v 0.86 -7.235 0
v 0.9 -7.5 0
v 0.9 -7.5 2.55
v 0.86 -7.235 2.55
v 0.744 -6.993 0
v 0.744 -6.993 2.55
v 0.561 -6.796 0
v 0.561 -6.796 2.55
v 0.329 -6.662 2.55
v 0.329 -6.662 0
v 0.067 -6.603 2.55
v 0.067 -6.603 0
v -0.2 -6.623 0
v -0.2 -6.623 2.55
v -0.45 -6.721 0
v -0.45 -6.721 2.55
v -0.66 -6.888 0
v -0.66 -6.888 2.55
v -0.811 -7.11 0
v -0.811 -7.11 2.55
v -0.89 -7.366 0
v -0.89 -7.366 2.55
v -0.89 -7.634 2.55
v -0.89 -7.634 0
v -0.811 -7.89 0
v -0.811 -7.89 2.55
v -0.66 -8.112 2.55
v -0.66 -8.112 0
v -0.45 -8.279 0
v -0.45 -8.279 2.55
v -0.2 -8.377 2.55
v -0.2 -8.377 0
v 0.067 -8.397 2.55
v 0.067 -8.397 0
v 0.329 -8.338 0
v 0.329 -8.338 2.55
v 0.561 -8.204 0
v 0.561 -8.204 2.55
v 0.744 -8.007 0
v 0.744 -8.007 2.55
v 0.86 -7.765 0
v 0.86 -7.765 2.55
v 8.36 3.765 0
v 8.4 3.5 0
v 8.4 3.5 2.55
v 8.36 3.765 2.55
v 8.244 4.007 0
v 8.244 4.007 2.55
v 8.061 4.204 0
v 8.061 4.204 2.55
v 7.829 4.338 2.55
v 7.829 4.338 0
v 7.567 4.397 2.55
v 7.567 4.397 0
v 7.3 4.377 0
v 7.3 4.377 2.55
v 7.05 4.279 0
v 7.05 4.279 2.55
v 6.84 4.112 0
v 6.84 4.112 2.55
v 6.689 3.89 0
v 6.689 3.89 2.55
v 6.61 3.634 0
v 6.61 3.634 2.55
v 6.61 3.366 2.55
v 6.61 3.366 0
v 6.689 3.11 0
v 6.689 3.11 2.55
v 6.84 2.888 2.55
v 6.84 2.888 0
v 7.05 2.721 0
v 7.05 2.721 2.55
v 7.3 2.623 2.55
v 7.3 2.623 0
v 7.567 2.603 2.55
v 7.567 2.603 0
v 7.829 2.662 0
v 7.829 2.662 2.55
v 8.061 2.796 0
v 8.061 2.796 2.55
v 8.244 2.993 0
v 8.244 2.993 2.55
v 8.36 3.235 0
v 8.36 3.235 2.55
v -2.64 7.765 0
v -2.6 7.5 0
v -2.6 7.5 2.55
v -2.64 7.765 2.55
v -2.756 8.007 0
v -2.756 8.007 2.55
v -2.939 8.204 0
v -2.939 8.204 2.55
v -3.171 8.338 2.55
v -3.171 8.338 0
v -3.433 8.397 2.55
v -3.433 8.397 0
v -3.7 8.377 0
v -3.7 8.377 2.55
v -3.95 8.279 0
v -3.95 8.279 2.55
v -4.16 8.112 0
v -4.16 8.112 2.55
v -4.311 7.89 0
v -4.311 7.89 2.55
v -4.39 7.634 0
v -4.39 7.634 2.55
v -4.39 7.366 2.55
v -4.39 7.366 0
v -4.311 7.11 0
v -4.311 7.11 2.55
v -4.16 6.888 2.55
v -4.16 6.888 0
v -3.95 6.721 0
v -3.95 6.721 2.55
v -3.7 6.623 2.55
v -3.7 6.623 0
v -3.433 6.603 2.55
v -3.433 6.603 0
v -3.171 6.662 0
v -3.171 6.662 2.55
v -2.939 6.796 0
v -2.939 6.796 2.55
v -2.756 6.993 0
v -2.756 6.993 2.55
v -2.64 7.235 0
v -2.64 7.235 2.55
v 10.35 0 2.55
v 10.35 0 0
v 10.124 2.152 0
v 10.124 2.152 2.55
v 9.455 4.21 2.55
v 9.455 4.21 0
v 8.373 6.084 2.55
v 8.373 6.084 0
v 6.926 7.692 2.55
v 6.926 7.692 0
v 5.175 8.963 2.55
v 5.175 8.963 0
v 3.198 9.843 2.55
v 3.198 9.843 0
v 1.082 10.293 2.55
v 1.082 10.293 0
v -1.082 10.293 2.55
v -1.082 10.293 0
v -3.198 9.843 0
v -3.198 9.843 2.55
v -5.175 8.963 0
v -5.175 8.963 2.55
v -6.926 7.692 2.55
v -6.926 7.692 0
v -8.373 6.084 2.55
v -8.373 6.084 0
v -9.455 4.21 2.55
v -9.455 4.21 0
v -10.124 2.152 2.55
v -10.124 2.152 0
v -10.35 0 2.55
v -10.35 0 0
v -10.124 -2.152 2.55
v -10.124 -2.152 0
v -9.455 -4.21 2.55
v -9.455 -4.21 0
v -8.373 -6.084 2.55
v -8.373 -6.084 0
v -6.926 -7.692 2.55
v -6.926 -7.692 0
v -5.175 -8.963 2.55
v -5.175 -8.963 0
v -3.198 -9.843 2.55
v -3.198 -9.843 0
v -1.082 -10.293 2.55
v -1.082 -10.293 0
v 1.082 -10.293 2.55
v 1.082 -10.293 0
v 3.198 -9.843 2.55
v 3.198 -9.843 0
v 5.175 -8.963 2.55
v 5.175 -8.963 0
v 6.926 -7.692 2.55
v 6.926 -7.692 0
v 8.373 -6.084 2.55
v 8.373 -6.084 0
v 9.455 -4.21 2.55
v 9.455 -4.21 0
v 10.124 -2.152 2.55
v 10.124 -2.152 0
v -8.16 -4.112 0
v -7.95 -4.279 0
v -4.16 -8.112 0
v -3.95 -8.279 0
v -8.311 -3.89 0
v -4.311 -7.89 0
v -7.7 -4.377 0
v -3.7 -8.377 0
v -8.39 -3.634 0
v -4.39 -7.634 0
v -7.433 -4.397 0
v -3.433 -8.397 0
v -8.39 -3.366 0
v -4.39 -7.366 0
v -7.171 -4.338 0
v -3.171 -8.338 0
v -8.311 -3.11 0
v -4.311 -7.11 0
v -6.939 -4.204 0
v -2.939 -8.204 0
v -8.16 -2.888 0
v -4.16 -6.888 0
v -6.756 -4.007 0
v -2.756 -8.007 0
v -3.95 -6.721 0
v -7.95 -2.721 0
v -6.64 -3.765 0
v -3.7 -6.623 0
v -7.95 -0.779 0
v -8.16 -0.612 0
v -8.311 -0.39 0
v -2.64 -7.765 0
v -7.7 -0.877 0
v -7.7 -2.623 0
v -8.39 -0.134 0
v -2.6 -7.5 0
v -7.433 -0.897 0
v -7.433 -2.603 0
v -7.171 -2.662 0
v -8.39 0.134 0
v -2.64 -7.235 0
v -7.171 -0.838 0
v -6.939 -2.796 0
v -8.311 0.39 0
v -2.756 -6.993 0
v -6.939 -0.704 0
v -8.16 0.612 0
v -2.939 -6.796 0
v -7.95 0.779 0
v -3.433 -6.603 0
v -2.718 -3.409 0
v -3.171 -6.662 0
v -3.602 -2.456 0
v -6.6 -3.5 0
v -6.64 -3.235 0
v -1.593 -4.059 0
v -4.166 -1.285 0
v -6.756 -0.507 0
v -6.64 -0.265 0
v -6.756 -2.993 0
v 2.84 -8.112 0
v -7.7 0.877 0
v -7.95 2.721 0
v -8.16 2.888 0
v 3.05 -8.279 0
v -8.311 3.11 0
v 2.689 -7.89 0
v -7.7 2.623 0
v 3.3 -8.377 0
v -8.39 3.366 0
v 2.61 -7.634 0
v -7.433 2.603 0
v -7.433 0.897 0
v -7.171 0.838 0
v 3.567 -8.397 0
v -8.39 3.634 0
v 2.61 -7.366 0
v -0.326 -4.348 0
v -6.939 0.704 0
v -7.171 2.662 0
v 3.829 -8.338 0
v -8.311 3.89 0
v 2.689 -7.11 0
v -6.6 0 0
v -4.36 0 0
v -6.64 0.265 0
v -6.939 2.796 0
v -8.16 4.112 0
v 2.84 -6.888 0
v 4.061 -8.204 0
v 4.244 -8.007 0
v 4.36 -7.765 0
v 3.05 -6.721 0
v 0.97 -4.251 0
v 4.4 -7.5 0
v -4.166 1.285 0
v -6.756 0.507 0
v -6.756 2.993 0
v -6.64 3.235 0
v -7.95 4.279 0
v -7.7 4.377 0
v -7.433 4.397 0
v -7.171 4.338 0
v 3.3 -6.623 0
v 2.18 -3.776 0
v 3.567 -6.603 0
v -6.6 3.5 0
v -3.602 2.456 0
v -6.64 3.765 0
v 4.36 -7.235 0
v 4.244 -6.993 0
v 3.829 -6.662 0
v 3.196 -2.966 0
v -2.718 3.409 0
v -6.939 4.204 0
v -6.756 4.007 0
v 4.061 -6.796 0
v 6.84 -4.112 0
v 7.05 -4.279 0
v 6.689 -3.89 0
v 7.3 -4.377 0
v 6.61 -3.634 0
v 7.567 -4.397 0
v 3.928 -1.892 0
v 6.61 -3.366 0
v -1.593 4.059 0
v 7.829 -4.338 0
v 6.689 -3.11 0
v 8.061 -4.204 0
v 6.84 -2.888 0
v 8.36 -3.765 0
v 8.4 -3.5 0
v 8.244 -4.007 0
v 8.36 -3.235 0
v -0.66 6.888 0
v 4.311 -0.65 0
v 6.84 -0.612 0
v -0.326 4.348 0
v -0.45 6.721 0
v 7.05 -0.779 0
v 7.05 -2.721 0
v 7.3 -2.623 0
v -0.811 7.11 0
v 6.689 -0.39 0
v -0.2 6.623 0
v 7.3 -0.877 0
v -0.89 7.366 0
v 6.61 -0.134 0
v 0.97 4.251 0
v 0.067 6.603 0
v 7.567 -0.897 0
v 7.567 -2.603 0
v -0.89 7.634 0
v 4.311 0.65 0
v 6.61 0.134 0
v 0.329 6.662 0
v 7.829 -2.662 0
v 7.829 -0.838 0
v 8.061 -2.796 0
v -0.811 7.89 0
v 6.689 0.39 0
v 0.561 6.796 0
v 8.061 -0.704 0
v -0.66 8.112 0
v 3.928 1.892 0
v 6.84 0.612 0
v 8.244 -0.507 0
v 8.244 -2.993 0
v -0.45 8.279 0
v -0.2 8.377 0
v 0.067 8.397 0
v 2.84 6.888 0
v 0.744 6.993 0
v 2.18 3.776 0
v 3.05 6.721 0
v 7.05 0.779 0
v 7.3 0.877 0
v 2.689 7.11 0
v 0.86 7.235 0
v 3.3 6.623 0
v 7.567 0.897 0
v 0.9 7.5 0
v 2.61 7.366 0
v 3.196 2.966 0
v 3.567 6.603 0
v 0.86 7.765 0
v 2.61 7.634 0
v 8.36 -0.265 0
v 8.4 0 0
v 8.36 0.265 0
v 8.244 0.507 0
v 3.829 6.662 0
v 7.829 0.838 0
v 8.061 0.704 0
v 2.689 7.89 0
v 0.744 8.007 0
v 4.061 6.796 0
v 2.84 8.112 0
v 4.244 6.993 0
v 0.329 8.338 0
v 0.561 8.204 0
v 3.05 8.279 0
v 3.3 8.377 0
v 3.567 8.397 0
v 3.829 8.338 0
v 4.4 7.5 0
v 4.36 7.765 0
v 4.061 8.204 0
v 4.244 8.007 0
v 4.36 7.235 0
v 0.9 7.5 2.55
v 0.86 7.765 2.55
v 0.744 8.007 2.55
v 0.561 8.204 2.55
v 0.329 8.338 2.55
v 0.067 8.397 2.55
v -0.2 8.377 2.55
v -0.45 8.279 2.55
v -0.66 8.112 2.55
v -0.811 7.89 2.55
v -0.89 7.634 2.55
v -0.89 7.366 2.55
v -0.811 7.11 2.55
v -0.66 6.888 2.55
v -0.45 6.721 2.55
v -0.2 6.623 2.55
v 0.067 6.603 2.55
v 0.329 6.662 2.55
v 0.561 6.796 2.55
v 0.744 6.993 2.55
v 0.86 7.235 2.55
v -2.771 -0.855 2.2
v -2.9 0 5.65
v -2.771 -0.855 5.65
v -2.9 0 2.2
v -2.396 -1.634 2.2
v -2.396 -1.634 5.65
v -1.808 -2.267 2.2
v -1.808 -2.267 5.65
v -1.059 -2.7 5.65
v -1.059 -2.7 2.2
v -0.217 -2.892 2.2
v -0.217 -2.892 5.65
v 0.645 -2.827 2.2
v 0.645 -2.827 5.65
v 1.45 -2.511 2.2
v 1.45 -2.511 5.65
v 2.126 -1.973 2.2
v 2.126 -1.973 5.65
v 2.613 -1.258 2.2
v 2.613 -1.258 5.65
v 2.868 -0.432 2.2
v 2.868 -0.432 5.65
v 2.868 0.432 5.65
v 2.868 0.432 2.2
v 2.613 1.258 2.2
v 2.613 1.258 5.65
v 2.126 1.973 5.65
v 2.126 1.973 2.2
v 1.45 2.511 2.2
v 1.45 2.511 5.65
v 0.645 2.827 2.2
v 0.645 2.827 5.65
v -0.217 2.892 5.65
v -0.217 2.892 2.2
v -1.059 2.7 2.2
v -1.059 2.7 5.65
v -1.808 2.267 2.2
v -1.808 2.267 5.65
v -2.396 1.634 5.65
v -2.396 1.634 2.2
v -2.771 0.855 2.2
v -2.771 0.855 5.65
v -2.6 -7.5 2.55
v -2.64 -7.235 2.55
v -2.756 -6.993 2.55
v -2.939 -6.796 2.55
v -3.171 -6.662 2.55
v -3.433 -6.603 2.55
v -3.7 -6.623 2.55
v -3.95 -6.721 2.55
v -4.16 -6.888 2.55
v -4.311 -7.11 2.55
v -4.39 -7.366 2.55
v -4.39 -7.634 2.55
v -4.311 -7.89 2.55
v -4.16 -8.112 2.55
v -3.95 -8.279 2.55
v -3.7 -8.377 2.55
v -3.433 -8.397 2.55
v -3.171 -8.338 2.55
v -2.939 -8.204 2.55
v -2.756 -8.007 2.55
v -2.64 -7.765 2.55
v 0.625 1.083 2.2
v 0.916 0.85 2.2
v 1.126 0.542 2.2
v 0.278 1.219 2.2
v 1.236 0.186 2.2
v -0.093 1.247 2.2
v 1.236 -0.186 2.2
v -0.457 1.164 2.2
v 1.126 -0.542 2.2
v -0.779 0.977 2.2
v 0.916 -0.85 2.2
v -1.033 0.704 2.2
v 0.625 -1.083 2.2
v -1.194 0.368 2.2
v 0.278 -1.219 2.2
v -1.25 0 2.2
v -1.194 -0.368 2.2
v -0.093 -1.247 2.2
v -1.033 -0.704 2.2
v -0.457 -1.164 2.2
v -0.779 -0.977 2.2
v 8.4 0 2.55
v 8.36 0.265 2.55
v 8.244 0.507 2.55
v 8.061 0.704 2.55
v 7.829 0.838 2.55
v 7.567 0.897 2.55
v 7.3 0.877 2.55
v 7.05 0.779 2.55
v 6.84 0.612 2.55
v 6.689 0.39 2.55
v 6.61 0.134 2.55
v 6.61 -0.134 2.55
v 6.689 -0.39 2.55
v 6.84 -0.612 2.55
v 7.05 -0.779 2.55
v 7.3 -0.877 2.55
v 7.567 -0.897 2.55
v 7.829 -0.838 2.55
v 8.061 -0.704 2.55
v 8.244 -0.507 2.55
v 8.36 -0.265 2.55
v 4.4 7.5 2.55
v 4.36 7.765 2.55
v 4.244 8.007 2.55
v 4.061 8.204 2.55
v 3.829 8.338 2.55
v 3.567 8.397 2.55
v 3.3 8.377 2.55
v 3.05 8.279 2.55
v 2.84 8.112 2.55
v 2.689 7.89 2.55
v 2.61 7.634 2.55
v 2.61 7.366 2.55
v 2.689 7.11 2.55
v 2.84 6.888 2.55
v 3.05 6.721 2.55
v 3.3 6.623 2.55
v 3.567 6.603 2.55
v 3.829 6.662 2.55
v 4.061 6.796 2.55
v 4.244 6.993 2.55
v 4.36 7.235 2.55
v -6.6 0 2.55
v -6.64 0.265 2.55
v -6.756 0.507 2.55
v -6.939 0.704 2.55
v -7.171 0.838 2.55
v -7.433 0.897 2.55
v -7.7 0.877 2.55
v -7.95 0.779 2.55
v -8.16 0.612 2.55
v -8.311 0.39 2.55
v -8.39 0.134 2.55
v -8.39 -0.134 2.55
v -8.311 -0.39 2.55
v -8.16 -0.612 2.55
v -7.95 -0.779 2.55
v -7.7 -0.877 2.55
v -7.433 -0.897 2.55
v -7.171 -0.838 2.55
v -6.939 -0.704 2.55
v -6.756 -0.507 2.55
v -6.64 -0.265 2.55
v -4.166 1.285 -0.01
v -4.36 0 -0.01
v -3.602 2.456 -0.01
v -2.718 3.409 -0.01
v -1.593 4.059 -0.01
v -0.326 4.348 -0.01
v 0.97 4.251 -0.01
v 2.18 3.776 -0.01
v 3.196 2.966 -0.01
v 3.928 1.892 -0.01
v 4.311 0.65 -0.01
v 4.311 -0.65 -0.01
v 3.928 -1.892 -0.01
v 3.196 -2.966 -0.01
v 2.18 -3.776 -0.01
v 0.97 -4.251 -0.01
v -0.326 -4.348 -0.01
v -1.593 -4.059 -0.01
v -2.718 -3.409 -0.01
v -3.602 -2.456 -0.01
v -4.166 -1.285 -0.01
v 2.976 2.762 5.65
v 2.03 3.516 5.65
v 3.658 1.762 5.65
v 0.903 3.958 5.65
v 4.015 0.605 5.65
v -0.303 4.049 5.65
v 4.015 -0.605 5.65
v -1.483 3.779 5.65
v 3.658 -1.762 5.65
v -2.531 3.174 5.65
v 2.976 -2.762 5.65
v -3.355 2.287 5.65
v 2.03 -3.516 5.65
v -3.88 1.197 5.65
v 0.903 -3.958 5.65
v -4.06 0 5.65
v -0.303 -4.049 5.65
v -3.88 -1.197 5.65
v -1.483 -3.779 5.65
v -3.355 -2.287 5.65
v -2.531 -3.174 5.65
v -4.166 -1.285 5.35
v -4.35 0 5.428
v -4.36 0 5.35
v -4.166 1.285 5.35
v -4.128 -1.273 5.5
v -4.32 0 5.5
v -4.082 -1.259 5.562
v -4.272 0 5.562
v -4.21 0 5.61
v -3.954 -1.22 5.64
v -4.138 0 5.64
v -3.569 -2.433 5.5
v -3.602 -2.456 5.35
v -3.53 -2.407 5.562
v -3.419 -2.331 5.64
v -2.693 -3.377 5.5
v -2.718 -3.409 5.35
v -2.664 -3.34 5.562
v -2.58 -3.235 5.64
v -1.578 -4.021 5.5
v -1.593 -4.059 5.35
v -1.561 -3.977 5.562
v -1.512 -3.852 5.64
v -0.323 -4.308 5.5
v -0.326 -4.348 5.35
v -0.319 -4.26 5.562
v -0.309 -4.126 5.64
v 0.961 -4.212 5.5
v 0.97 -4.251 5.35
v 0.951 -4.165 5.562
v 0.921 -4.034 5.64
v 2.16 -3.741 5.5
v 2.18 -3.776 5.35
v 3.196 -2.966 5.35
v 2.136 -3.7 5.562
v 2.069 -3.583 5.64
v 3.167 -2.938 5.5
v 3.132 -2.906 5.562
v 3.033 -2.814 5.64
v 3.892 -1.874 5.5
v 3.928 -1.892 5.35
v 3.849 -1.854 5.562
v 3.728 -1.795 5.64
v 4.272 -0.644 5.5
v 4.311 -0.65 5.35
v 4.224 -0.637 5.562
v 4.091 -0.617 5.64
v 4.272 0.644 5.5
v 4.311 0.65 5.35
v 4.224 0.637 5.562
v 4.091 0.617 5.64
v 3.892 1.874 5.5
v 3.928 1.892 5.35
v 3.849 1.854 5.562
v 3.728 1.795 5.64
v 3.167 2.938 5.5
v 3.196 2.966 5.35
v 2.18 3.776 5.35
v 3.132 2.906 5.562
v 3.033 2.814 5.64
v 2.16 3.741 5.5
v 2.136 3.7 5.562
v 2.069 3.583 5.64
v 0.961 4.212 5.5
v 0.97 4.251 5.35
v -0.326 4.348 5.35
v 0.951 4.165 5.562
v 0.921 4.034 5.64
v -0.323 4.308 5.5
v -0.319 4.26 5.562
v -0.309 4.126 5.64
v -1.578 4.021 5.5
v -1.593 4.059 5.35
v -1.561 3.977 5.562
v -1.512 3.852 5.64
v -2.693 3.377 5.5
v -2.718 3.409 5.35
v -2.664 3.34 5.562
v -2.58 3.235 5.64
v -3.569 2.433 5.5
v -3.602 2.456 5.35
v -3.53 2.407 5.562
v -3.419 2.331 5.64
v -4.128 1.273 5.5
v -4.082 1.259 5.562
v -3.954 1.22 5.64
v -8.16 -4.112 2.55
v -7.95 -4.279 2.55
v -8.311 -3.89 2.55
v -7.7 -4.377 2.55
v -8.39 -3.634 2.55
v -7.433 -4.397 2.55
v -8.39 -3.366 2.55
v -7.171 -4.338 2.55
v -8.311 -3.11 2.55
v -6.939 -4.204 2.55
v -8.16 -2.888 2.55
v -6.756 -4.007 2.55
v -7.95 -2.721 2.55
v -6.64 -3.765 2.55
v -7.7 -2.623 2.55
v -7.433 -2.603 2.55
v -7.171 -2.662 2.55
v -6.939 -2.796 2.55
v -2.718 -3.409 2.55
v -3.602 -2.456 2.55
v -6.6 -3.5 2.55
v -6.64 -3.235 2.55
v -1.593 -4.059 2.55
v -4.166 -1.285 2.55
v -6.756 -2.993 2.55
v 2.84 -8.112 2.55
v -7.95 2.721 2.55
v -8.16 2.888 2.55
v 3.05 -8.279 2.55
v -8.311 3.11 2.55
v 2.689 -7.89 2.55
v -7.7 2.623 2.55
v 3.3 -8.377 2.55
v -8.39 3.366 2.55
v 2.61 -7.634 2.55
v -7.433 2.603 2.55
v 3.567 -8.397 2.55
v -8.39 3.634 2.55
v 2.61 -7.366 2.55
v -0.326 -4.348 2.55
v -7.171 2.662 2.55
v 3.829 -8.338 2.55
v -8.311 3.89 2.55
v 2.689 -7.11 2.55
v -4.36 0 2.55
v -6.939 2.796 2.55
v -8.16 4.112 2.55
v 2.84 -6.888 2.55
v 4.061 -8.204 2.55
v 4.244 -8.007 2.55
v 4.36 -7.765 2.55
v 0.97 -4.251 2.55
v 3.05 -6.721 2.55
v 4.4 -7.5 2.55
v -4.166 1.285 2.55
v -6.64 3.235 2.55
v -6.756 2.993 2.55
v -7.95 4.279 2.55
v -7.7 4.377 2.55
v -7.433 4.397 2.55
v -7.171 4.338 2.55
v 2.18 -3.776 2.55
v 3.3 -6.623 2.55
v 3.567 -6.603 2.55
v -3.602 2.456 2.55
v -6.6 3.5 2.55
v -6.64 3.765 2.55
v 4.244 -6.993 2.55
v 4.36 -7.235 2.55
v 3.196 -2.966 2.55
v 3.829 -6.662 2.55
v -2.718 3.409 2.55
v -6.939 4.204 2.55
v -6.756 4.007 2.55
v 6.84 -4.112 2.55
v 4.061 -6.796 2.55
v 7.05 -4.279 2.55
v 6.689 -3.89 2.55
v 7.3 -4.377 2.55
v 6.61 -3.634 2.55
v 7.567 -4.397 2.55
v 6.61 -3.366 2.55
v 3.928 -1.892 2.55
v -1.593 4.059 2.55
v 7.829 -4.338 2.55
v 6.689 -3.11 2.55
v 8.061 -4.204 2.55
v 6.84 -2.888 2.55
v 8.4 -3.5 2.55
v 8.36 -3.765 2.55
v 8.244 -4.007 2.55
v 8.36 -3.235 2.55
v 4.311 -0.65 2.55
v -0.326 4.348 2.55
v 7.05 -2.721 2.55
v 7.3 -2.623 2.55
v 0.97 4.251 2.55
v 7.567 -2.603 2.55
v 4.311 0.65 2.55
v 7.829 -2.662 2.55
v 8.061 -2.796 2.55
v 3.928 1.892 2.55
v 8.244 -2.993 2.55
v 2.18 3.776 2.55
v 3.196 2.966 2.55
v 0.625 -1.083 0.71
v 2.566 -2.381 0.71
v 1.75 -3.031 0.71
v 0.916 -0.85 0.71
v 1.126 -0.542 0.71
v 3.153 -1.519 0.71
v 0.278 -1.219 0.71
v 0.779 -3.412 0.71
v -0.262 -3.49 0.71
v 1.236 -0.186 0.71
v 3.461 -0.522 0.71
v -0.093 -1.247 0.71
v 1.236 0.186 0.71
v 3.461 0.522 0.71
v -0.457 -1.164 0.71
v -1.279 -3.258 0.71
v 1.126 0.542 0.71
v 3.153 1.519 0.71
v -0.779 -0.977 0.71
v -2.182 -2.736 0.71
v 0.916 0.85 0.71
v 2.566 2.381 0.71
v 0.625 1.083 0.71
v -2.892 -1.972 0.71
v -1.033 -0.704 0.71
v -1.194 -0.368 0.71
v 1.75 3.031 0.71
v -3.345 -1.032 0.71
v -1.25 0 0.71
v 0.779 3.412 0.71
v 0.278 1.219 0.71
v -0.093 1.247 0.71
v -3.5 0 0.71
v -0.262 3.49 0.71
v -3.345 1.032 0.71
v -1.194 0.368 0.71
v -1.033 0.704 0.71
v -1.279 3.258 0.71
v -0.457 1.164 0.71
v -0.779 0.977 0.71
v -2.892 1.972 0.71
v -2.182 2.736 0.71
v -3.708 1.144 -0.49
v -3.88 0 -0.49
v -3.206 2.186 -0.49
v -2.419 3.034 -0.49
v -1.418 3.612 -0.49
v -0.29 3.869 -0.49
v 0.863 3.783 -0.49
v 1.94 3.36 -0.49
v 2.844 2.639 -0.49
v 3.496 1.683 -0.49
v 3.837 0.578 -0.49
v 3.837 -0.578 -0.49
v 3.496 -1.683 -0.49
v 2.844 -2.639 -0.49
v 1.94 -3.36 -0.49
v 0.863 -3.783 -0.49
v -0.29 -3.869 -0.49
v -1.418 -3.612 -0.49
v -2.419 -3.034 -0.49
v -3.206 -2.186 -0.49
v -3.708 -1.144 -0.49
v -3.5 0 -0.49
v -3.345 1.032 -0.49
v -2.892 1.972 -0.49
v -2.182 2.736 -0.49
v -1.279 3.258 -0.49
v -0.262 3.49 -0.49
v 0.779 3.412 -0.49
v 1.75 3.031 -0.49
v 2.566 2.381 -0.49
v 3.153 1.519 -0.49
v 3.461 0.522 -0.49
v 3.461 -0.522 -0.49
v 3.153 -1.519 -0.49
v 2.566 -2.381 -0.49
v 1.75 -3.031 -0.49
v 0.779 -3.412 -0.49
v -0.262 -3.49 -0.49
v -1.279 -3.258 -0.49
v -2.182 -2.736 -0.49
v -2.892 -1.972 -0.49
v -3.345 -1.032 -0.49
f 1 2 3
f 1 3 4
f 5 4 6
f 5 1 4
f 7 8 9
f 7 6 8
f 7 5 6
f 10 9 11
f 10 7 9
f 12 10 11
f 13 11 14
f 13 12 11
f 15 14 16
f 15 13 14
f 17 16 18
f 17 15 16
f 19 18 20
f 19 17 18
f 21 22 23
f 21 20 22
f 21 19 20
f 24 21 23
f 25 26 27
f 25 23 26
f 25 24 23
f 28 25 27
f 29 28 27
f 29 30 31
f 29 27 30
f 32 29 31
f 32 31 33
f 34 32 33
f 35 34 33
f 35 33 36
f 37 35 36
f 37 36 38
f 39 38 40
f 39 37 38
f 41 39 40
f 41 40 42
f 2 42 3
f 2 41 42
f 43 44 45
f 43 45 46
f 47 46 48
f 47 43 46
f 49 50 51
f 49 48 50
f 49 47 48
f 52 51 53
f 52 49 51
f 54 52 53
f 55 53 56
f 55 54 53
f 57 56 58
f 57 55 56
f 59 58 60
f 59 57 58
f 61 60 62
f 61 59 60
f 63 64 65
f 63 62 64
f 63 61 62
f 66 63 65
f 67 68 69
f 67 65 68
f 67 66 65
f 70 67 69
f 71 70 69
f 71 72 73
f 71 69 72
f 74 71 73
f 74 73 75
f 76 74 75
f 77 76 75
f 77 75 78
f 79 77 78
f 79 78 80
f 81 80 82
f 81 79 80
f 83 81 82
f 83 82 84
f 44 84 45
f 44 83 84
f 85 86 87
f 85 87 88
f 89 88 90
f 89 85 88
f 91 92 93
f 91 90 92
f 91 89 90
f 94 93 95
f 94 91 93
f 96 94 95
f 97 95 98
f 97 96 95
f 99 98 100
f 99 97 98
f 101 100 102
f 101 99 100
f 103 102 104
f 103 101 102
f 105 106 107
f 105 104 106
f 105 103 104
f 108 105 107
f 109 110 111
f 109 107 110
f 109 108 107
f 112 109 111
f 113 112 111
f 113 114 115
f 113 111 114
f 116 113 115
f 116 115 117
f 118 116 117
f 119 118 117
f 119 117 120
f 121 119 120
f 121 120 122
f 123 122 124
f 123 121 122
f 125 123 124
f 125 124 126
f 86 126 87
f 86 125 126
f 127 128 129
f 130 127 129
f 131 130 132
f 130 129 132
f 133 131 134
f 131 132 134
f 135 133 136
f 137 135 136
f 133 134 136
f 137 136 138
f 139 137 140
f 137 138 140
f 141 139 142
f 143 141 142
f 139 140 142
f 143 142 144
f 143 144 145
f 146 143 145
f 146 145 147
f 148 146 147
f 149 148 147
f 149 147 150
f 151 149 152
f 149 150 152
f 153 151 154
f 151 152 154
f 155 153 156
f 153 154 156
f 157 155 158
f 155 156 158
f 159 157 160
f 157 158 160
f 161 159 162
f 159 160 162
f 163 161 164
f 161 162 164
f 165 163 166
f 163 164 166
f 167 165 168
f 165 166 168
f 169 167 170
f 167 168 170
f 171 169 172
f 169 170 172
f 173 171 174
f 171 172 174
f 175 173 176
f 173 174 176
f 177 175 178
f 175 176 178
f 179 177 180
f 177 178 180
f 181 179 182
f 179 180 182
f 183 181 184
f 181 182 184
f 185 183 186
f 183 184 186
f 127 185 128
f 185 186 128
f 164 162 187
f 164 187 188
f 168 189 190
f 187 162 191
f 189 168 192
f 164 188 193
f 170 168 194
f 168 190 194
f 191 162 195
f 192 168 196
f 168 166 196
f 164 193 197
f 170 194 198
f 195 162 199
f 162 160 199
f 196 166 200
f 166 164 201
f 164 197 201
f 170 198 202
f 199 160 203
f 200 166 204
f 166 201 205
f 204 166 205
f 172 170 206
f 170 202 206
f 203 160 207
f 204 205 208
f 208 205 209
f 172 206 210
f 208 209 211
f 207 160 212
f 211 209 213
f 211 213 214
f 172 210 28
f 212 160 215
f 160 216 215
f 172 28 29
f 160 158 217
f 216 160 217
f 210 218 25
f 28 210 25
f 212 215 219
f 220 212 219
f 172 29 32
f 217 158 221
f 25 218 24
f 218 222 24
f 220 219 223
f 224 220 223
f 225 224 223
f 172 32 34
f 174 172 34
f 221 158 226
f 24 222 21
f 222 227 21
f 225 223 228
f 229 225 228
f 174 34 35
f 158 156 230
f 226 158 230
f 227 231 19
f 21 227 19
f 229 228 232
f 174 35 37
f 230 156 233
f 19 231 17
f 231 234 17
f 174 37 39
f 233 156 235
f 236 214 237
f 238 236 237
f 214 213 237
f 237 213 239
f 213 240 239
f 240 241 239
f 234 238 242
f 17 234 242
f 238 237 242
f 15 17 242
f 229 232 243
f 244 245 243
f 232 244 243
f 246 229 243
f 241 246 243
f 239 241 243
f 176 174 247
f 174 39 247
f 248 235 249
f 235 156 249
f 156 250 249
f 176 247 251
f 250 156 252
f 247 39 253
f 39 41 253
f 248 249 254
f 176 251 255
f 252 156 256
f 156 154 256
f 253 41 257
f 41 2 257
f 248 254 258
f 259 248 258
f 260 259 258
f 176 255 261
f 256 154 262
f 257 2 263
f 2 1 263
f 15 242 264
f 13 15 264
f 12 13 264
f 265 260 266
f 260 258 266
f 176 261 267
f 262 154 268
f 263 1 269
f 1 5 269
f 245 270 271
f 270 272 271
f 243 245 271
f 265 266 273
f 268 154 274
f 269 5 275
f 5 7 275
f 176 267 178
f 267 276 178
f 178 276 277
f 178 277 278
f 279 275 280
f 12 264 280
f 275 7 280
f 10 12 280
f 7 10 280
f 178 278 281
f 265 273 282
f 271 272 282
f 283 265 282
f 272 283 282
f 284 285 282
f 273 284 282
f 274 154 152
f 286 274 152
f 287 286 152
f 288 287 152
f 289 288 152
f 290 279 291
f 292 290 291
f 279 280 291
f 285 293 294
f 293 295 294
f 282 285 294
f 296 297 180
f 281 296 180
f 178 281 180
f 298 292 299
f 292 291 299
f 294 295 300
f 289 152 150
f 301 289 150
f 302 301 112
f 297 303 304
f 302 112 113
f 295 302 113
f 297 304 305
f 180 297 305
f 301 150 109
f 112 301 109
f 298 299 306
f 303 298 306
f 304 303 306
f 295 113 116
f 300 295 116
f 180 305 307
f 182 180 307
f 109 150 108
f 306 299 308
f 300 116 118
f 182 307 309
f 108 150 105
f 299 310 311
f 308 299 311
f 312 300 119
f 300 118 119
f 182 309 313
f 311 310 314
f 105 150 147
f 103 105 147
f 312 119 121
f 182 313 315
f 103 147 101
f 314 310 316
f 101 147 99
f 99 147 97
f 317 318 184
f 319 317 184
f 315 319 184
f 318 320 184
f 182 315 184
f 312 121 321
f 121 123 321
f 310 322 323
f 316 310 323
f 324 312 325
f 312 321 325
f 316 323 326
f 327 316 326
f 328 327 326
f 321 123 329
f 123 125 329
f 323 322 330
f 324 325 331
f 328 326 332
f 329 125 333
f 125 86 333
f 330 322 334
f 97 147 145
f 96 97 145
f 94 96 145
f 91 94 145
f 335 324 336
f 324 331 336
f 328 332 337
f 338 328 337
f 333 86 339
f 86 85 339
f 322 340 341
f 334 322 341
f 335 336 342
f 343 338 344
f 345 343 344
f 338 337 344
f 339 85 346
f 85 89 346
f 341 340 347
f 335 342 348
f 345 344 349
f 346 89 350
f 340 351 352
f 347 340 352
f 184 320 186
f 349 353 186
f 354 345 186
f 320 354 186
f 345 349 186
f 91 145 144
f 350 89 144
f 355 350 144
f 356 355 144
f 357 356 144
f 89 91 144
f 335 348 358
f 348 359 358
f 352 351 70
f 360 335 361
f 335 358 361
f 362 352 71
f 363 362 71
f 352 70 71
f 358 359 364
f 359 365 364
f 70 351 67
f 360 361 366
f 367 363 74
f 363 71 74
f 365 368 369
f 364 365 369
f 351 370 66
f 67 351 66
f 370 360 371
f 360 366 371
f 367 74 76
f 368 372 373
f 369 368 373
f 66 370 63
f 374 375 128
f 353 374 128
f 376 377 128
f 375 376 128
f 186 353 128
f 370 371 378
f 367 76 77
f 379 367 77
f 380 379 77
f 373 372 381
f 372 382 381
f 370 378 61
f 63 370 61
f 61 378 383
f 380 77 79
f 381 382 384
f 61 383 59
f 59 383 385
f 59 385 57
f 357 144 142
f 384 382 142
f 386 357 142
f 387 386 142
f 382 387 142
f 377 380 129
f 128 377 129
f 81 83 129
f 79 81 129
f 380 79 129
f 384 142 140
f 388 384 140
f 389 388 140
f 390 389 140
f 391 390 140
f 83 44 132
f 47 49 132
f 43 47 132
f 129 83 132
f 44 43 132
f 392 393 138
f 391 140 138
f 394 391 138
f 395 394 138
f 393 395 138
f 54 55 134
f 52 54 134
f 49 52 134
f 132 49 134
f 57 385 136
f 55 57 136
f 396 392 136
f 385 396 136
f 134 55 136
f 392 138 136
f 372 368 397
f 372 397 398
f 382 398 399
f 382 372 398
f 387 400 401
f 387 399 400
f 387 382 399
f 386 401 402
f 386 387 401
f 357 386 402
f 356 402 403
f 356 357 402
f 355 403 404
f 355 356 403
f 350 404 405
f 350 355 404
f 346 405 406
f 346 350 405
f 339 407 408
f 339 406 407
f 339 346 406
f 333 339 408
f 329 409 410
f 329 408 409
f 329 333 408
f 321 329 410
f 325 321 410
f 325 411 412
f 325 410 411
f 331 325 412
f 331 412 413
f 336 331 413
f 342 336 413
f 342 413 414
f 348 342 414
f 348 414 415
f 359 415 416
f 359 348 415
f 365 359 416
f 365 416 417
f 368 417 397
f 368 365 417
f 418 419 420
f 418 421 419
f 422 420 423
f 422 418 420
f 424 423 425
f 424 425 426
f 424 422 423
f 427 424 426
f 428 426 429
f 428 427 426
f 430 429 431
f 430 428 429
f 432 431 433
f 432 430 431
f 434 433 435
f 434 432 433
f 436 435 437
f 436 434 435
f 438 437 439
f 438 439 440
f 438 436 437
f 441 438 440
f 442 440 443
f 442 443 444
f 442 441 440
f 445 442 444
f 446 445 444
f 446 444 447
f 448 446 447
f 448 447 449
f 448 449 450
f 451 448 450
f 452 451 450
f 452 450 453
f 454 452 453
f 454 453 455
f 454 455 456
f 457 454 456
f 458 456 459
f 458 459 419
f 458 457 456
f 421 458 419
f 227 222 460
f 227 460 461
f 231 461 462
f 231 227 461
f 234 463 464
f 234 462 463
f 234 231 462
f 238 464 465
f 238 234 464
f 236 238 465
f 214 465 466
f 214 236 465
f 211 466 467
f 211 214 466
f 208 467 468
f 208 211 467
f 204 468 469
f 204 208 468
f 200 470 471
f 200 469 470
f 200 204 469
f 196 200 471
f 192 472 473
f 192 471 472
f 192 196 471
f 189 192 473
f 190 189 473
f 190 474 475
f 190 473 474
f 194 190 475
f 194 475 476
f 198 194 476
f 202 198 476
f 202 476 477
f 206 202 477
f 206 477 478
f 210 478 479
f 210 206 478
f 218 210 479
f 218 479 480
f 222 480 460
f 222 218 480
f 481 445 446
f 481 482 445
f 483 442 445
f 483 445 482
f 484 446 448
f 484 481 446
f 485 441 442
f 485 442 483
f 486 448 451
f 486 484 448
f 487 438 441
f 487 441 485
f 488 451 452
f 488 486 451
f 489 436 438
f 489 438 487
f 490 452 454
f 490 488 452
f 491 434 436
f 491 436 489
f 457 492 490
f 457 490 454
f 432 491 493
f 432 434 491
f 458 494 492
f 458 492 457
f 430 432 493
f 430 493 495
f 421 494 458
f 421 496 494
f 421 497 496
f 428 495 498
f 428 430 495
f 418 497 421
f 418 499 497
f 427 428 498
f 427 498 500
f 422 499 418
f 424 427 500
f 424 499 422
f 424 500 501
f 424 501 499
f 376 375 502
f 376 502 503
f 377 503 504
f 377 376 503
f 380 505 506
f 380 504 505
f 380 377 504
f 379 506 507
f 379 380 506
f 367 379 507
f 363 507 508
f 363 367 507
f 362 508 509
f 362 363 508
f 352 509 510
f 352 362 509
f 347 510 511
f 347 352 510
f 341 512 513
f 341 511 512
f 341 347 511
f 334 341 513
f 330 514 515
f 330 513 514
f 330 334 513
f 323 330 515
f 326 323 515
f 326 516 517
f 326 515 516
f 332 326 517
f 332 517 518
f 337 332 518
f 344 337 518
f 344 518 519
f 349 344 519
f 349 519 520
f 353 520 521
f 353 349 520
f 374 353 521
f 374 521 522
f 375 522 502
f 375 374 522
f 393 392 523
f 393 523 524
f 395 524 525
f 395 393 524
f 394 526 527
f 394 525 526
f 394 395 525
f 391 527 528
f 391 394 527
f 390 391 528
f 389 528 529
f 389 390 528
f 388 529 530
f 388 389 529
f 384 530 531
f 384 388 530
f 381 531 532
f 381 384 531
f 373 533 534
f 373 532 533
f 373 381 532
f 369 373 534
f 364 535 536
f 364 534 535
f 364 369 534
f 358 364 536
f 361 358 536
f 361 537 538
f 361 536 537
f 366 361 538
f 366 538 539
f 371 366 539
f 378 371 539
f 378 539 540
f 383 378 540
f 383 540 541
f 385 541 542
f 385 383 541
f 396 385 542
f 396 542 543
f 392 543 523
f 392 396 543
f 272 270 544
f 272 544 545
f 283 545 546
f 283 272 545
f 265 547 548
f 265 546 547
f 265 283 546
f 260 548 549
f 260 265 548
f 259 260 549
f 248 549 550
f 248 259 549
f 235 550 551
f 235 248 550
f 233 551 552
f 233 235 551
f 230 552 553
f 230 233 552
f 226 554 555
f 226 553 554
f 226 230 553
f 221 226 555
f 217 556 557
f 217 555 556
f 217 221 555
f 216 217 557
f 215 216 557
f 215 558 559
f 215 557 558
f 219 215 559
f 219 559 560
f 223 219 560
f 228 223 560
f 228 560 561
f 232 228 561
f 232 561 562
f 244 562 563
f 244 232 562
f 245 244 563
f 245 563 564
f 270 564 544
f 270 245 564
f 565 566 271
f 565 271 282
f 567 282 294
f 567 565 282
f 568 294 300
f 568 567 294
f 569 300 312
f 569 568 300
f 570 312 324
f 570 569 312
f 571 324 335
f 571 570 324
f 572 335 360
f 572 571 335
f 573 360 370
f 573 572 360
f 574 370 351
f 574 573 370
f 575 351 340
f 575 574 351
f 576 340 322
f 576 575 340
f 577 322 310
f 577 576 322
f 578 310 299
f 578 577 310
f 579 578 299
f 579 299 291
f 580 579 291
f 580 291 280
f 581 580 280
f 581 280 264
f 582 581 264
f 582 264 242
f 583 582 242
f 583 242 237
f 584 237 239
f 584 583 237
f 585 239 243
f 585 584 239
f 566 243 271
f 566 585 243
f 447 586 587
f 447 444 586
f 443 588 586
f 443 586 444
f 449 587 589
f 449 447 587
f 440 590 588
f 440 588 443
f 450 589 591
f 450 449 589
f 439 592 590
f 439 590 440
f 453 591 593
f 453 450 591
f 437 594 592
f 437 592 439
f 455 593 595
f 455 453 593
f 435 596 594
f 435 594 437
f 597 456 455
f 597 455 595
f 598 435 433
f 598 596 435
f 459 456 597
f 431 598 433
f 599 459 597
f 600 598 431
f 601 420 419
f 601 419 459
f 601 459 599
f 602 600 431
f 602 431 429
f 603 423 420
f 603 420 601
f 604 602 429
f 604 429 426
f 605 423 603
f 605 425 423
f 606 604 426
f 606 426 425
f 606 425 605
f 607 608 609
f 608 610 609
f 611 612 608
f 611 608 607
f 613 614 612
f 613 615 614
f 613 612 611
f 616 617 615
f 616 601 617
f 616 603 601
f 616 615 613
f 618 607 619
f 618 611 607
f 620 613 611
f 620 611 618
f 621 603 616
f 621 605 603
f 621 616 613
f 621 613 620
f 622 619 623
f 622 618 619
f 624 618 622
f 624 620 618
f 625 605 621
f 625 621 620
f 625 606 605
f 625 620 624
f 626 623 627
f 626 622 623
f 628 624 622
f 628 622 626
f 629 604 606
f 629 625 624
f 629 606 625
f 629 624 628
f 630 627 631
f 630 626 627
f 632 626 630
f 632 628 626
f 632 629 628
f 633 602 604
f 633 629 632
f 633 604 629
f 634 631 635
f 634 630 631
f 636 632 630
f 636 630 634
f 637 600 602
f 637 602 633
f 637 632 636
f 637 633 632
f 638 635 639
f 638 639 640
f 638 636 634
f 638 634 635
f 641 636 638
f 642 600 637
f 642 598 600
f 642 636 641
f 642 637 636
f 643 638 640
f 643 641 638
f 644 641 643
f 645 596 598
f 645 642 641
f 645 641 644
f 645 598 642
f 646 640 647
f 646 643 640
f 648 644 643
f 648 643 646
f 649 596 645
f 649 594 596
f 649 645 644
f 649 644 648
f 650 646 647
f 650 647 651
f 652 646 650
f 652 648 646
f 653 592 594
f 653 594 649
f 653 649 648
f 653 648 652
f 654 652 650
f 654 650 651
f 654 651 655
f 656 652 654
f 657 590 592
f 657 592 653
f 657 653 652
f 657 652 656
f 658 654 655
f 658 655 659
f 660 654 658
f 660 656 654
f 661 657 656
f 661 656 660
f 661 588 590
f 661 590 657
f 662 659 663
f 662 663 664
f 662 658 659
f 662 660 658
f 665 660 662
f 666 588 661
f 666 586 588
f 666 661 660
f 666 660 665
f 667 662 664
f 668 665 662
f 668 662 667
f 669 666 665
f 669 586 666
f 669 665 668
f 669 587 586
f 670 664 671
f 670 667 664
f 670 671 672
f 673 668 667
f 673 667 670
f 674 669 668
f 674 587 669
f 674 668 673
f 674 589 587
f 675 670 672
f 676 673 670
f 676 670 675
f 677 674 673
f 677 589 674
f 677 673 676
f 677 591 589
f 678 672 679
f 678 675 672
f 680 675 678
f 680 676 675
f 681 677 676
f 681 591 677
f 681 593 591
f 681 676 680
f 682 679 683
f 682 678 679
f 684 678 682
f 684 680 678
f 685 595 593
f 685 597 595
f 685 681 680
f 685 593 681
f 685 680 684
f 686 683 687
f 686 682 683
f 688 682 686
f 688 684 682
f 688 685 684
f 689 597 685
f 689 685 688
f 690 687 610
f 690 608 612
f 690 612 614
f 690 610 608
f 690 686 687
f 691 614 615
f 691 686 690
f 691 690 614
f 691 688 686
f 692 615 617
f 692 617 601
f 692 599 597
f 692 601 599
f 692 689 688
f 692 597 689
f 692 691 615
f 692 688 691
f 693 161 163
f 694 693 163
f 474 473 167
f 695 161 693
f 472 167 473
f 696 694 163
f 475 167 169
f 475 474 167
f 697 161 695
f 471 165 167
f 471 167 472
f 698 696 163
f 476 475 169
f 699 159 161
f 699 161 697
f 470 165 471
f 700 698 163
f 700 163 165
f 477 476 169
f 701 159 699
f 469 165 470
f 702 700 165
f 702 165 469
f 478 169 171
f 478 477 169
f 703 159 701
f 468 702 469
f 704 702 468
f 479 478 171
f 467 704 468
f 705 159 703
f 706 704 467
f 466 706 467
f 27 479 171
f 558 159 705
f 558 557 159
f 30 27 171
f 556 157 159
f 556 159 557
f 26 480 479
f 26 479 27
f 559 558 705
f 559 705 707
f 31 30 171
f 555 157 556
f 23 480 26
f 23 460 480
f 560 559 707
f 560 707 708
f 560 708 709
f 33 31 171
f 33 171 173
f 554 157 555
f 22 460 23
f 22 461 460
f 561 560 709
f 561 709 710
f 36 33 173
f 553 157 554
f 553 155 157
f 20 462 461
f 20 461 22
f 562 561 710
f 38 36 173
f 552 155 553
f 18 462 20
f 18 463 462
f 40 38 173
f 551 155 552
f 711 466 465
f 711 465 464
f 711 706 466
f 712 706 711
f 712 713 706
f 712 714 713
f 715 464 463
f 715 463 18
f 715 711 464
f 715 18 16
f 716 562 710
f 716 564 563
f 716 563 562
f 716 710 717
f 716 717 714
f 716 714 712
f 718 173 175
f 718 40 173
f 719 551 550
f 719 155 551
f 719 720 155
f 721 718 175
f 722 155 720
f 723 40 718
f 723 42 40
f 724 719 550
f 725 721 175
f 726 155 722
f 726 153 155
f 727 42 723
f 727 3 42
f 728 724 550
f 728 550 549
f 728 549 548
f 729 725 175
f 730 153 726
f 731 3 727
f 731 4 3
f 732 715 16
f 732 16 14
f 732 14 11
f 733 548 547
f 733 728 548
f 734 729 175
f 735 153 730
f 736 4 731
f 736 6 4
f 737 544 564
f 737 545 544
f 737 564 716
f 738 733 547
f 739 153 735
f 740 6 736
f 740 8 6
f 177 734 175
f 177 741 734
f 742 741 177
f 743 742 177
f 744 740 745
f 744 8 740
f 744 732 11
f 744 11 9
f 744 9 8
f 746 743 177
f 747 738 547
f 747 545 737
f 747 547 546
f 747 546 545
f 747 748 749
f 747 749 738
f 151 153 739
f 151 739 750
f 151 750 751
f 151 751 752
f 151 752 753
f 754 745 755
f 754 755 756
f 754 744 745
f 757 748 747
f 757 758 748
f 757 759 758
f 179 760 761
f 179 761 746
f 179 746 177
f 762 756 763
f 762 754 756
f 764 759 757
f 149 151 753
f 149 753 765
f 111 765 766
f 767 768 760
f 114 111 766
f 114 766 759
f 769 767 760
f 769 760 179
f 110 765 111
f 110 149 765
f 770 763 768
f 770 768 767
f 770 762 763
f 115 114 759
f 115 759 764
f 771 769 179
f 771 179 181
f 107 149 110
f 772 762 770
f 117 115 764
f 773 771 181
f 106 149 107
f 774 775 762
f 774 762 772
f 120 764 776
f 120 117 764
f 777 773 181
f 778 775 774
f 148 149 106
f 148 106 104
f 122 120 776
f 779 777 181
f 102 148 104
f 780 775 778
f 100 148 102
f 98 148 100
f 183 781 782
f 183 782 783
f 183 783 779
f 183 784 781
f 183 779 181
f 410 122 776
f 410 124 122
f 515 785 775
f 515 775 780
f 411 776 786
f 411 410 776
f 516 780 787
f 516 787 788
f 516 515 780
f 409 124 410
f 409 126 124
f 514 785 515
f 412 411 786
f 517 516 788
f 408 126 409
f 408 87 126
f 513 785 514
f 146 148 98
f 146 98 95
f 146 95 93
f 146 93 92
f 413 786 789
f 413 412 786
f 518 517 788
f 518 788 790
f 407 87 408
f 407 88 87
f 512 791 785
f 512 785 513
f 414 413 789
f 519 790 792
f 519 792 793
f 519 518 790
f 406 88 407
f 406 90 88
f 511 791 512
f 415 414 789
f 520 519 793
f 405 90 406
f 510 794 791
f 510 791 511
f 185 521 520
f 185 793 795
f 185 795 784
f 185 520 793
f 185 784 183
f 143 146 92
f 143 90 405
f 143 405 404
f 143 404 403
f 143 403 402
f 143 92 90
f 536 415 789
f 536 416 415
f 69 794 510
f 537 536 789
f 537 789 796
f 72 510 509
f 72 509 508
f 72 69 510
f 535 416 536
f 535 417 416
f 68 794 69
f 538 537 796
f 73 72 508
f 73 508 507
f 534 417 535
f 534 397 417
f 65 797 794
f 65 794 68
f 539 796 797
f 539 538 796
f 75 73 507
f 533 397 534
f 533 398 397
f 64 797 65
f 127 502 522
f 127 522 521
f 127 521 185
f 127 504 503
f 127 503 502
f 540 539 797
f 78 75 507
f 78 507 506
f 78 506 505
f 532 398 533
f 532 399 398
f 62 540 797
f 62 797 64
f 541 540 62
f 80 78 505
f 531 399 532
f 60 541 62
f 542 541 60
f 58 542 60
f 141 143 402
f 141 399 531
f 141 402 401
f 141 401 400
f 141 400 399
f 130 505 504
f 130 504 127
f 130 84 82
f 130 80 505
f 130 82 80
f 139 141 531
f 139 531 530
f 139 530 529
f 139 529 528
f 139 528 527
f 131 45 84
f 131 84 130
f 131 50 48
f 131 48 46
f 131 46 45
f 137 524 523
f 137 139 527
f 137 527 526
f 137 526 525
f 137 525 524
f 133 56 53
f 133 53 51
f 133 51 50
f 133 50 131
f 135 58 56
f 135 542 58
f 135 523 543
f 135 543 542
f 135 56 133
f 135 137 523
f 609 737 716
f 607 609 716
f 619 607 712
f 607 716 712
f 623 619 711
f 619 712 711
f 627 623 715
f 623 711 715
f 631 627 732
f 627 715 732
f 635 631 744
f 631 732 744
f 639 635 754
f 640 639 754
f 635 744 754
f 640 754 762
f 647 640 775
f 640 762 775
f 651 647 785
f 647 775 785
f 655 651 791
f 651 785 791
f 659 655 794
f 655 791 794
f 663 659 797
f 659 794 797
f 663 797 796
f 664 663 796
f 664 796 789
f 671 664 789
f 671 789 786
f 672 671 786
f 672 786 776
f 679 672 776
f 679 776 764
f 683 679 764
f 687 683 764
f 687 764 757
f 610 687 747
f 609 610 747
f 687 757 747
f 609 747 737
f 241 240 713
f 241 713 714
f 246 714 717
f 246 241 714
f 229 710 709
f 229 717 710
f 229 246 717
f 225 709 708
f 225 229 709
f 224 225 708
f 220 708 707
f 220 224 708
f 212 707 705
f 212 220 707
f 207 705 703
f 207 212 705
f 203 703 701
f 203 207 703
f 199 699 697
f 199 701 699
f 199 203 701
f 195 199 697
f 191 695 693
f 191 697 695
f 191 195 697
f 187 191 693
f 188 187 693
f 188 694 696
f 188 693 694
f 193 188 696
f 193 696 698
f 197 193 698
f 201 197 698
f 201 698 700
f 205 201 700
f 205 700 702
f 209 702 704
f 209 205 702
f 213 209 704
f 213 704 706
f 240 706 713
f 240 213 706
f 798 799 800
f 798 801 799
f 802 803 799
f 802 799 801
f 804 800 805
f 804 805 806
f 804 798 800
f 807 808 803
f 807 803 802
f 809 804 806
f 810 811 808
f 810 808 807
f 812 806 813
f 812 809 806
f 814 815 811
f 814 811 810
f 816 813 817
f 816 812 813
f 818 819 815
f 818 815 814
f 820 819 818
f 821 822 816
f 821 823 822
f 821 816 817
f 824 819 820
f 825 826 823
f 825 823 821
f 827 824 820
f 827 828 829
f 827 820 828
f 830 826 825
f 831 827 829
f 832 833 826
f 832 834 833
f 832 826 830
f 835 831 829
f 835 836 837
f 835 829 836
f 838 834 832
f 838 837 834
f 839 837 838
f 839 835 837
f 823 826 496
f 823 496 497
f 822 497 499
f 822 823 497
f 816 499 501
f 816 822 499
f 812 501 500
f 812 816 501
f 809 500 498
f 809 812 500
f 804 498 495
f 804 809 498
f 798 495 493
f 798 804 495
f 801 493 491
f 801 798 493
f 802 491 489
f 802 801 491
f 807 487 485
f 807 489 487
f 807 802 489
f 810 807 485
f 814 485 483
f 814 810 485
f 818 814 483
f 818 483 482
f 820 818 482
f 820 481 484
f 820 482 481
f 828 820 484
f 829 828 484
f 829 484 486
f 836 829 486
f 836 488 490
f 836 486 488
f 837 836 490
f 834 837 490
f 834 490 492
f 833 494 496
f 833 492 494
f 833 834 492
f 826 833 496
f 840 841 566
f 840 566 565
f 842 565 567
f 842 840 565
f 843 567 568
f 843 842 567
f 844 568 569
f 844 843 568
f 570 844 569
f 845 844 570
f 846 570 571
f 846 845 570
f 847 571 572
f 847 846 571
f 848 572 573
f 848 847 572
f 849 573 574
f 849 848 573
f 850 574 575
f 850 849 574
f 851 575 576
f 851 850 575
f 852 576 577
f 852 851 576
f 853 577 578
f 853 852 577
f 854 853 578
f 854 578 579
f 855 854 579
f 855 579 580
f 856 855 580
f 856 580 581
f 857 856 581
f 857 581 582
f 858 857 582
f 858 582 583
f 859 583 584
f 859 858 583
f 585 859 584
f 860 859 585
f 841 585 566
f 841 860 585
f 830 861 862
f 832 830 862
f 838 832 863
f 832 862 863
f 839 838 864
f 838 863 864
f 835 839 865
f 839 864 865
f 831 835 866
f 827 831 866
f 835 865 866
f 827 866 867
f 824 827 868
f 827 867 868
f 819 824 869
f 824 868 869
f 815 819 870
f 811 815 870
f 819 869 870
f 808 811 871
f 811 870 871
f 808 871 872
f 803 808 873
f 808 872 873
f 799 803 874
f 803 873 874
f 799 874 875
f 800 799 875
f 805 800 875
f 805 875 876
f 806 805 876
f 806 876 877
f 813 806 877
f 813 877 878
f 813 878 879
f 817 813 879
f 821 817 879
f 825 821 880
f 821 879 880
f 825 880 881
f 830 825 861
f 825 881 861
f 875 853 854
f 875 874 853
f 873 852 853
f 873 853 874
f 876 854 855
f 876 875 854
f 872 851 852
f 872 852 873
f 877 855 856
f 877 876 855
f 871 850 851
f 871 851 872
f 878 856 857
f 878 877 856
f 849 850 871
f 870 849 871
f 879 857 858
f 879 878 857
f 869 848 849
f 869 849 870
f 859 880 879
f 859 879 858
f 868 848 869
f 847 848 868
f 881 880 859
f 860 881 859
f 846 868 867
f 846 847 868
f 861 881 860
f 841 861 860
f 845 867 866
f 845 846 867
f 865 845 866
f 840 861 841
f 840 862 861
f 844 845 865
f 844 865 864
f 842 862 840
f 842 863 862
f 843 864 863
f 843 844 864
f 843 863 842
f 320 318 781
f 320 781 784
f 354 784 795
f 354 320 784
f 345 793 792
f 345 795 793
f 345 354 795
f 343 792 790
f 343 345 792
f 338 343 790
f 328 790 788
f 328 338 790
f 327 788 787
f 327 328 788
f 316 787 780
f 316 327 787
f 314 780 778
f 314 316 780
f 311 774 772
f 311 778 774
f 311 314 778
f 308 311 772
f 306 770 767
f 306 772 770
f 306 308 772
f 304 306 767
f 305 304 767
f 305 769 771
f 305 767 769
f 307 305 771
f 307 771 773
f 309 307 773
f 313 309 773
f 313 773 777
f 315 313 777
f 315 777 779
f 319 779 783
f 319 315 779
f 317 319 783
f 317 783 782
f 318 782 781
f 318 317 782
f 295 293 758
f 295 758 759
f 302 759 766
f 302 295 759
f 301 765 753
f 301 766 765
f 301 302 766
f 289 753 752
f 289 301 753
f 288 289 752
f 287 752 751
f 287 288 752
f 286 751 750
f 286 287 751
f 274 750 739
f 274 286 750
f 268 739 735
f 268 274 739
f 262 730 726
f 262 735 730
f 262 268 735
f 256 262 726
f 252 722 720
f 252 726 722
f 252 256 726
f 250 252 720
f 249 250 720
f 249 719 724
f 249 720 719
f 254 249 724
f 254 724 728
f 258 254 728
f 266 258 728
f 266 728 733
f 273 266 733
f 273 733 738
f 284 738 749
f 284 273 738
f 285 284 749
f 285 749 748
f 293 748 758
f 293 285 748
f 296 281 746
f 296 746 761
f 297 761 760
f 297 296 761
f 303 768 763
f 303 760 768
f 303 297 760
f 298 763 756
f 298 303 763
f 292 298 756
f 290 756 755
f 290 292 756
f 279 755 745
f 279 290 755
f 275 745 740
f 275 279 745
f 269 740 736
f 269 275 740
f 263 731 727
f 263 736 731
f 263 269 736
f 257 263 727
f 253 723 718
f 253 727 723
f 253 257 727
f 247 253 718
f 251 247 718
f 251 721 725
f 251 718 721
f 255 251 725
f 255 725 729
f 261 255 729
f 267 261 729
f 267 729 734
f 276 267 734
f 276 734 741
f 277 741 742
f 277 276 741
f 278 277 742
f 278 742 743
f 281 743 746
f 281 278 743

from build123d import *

# Parameters (mm, degrees)
ESBO_O1_R                  = 10.35
RESSALTO_EXTRUS_O1_DEPTH   = 2.55
ESBO_O2_R                  = 4.36
ESBO_O2_R_2                = 2.9
RESSALTO_EXTRUS_O2_DEPTH   = 3.1
RESSALTO_EXTRUS_O3_START   = 0.49
ESBO_O3_R                  = 4.36
RESSALTO_EXTRUS_O3_DEPTH   = 0.49
CHANFRO1_SIZE              = 0.48
ESBO_O4_R                  = 3.5
CORTE_EXTRUS_O1_DEPTH      = 1.2
CORTE_EXTRUS_O2_DEPTH      = 7
CORTE_EXTRUS_O2_DEPTH_BACK = 7.2
ESBO_O5_R                  = 1.25
FILETE1_R                  = 0.3
CORTE_EXTRUS_O3_DEPTH      = 2
CORTE_EXTRUS_O3_DEPTH_BACK = 4.2
ESBO_O6_R                  = 0.9
CORTE_EXTRUS_O4_START      = -3.45
ESBO_O8_R                  = 2.9
CORTE_EXTRUS_O4_DEPTH      = 3.45


with BuildPart() as part:
    # Esboço1 → Ressalto-extrusão1 (new body)
    with BuildSketch(Plane.XY):
        Circle(ESBO_O1_R)
    extrude(amount=RESSALTO_EXTRUS_O1_DEPTH)

    # Esboço2 → Ressalto-extrusão2 (add)
    with BuildSketch(Plane.XY.offset(2.55)):
        with Locations(Location((0, 0, 0), (0, 0, 180))):
            Circle(ESBO_O2_R)
        with Locations(Location((0, 0, 0), (0, 0, 180))):
            Circle(ESBO_O2_R_2, mode=Mode.SUBTRACT)
    extrude(amount=RESSALTO_EXTRUS_O2_DEPTH)

    # Esboço3 → Ressalto-extrusão3 (add)
    with BuildSketch(Plane(origin=(0, 0, 0), x_dir=(-1, 0, 0), z_dir=(0, 0, -1)).offset(RESSALTO_EXTRUS_O3_START)):
        Circle(ESBO_O3_R)
    extrude(amount=-RESSALTO_EXTRUS_O3_DEPTH)

    # Chanfro1
    chanfro1_edges = [part.edges().sort_by_distance(p)[0] for p in [
        (4.36, 0, -0.49),
    ]]
    chamfer(chanfro1_edges, length=CHANFRO1_SIZE)

    # Esboço4 → Corte-extrusão1 (cut)
    with BuildSketch(Plane(origin=(0, 0, -0.49), x_dir=(-1, 0, 0), z_dir=(0, 0, -1))):
        Circle(ESBO_O4_R)
    extrude(amount=-CORTE_EXTRUS_O1_DEPTH, mode=Mode.SUBTRACT)

    # Esboço5 → Corte-extrusão2 (cut, two sides: drawn at the far end of the back side and taken through both)
    with BuildSketch(Plane.XY.offset(2.55).offset(-CORTE_EXTRUS_O2_DEPTH_BACK)):
        with Locations(Location((0, 0, 0), (0, 0, 180))):
            Circle(ESBO_O5_R)
    extrude(amount=CORTE_EXTRUS_O2_DEPTH + CORTE_EXTRUS_O2_DEPTH_BACK, mode=Mode.SUBTRACT)

    # Filete1
    filete1_edges = [part.edges().sort_by_distance(p)[0] for p in [
        (4.36, 0, 5.65),
    ]]
    fillet(filete1_edges, radius=FILETE1_R)

    # Esboço6 → Corte-extrusão3 (cut, two sides: drawn at the far end of the back side and taken through both)
    with BuildSketch(Plane.XY.offset(2.55).offset(-CORTE_EXTRUS_O3_DEPTH_BACK)):
        with Locations((0, 7.5)):
            Circle(ESBO_O6_R)
        with Locations((-3.5, 7.5)):
            Circle(ESBO_O6_R)
        with Locations((3.5, 7.5)):
            Circle(ESBO_O6_R)
        with Locations((7.5, 0)):
            Circle(ESBO_O6_R)
        with Locations((7.5, 3.5)):
            Circle(ESBO_O6_R)
        with Locations((7.5, -3.5)):
            Circle(ESBO_O6_R)
        with Locations((-7.5, -3.5)):
            Circle(ESBO_O6_R)
        with Locations((-7.5, 3.5)):
            Circle(ESBO_O6_R)
        with Locations((-7.5, 0)):
            Circle(ESBO_O6_R)
        with Locations((3.5, -7.5)):
            Circle(ESBO_O6_R)
        with Locations((-3.5, -7.5)):
            Circle(ESBO_O6_R)
        with Locations((0, -7.5)):
            Circle(ESBO_O6_R)
    extrude(amount=CORTE_EXTRUS_O3_DEPTH + CORTE_EXTRUS_O3_DEPTH_BACK, mode=Mode.SUBTRACT)

    # Esboço8 → Corte-extrusão4 (cut)
    with BuildSketch(Plane.XY.offset(5.65).offset(CORTE_EXTRUS_O4_START)):
        with Locations(Location((0, 0, 0), (0, 0, 180))):
            Circle(ESBO_O8_R)
    extrude(amount=CORTE_EXTRUS_O4_DEPTH, mode=Mode.SUBTRACT)


solid = part.part
